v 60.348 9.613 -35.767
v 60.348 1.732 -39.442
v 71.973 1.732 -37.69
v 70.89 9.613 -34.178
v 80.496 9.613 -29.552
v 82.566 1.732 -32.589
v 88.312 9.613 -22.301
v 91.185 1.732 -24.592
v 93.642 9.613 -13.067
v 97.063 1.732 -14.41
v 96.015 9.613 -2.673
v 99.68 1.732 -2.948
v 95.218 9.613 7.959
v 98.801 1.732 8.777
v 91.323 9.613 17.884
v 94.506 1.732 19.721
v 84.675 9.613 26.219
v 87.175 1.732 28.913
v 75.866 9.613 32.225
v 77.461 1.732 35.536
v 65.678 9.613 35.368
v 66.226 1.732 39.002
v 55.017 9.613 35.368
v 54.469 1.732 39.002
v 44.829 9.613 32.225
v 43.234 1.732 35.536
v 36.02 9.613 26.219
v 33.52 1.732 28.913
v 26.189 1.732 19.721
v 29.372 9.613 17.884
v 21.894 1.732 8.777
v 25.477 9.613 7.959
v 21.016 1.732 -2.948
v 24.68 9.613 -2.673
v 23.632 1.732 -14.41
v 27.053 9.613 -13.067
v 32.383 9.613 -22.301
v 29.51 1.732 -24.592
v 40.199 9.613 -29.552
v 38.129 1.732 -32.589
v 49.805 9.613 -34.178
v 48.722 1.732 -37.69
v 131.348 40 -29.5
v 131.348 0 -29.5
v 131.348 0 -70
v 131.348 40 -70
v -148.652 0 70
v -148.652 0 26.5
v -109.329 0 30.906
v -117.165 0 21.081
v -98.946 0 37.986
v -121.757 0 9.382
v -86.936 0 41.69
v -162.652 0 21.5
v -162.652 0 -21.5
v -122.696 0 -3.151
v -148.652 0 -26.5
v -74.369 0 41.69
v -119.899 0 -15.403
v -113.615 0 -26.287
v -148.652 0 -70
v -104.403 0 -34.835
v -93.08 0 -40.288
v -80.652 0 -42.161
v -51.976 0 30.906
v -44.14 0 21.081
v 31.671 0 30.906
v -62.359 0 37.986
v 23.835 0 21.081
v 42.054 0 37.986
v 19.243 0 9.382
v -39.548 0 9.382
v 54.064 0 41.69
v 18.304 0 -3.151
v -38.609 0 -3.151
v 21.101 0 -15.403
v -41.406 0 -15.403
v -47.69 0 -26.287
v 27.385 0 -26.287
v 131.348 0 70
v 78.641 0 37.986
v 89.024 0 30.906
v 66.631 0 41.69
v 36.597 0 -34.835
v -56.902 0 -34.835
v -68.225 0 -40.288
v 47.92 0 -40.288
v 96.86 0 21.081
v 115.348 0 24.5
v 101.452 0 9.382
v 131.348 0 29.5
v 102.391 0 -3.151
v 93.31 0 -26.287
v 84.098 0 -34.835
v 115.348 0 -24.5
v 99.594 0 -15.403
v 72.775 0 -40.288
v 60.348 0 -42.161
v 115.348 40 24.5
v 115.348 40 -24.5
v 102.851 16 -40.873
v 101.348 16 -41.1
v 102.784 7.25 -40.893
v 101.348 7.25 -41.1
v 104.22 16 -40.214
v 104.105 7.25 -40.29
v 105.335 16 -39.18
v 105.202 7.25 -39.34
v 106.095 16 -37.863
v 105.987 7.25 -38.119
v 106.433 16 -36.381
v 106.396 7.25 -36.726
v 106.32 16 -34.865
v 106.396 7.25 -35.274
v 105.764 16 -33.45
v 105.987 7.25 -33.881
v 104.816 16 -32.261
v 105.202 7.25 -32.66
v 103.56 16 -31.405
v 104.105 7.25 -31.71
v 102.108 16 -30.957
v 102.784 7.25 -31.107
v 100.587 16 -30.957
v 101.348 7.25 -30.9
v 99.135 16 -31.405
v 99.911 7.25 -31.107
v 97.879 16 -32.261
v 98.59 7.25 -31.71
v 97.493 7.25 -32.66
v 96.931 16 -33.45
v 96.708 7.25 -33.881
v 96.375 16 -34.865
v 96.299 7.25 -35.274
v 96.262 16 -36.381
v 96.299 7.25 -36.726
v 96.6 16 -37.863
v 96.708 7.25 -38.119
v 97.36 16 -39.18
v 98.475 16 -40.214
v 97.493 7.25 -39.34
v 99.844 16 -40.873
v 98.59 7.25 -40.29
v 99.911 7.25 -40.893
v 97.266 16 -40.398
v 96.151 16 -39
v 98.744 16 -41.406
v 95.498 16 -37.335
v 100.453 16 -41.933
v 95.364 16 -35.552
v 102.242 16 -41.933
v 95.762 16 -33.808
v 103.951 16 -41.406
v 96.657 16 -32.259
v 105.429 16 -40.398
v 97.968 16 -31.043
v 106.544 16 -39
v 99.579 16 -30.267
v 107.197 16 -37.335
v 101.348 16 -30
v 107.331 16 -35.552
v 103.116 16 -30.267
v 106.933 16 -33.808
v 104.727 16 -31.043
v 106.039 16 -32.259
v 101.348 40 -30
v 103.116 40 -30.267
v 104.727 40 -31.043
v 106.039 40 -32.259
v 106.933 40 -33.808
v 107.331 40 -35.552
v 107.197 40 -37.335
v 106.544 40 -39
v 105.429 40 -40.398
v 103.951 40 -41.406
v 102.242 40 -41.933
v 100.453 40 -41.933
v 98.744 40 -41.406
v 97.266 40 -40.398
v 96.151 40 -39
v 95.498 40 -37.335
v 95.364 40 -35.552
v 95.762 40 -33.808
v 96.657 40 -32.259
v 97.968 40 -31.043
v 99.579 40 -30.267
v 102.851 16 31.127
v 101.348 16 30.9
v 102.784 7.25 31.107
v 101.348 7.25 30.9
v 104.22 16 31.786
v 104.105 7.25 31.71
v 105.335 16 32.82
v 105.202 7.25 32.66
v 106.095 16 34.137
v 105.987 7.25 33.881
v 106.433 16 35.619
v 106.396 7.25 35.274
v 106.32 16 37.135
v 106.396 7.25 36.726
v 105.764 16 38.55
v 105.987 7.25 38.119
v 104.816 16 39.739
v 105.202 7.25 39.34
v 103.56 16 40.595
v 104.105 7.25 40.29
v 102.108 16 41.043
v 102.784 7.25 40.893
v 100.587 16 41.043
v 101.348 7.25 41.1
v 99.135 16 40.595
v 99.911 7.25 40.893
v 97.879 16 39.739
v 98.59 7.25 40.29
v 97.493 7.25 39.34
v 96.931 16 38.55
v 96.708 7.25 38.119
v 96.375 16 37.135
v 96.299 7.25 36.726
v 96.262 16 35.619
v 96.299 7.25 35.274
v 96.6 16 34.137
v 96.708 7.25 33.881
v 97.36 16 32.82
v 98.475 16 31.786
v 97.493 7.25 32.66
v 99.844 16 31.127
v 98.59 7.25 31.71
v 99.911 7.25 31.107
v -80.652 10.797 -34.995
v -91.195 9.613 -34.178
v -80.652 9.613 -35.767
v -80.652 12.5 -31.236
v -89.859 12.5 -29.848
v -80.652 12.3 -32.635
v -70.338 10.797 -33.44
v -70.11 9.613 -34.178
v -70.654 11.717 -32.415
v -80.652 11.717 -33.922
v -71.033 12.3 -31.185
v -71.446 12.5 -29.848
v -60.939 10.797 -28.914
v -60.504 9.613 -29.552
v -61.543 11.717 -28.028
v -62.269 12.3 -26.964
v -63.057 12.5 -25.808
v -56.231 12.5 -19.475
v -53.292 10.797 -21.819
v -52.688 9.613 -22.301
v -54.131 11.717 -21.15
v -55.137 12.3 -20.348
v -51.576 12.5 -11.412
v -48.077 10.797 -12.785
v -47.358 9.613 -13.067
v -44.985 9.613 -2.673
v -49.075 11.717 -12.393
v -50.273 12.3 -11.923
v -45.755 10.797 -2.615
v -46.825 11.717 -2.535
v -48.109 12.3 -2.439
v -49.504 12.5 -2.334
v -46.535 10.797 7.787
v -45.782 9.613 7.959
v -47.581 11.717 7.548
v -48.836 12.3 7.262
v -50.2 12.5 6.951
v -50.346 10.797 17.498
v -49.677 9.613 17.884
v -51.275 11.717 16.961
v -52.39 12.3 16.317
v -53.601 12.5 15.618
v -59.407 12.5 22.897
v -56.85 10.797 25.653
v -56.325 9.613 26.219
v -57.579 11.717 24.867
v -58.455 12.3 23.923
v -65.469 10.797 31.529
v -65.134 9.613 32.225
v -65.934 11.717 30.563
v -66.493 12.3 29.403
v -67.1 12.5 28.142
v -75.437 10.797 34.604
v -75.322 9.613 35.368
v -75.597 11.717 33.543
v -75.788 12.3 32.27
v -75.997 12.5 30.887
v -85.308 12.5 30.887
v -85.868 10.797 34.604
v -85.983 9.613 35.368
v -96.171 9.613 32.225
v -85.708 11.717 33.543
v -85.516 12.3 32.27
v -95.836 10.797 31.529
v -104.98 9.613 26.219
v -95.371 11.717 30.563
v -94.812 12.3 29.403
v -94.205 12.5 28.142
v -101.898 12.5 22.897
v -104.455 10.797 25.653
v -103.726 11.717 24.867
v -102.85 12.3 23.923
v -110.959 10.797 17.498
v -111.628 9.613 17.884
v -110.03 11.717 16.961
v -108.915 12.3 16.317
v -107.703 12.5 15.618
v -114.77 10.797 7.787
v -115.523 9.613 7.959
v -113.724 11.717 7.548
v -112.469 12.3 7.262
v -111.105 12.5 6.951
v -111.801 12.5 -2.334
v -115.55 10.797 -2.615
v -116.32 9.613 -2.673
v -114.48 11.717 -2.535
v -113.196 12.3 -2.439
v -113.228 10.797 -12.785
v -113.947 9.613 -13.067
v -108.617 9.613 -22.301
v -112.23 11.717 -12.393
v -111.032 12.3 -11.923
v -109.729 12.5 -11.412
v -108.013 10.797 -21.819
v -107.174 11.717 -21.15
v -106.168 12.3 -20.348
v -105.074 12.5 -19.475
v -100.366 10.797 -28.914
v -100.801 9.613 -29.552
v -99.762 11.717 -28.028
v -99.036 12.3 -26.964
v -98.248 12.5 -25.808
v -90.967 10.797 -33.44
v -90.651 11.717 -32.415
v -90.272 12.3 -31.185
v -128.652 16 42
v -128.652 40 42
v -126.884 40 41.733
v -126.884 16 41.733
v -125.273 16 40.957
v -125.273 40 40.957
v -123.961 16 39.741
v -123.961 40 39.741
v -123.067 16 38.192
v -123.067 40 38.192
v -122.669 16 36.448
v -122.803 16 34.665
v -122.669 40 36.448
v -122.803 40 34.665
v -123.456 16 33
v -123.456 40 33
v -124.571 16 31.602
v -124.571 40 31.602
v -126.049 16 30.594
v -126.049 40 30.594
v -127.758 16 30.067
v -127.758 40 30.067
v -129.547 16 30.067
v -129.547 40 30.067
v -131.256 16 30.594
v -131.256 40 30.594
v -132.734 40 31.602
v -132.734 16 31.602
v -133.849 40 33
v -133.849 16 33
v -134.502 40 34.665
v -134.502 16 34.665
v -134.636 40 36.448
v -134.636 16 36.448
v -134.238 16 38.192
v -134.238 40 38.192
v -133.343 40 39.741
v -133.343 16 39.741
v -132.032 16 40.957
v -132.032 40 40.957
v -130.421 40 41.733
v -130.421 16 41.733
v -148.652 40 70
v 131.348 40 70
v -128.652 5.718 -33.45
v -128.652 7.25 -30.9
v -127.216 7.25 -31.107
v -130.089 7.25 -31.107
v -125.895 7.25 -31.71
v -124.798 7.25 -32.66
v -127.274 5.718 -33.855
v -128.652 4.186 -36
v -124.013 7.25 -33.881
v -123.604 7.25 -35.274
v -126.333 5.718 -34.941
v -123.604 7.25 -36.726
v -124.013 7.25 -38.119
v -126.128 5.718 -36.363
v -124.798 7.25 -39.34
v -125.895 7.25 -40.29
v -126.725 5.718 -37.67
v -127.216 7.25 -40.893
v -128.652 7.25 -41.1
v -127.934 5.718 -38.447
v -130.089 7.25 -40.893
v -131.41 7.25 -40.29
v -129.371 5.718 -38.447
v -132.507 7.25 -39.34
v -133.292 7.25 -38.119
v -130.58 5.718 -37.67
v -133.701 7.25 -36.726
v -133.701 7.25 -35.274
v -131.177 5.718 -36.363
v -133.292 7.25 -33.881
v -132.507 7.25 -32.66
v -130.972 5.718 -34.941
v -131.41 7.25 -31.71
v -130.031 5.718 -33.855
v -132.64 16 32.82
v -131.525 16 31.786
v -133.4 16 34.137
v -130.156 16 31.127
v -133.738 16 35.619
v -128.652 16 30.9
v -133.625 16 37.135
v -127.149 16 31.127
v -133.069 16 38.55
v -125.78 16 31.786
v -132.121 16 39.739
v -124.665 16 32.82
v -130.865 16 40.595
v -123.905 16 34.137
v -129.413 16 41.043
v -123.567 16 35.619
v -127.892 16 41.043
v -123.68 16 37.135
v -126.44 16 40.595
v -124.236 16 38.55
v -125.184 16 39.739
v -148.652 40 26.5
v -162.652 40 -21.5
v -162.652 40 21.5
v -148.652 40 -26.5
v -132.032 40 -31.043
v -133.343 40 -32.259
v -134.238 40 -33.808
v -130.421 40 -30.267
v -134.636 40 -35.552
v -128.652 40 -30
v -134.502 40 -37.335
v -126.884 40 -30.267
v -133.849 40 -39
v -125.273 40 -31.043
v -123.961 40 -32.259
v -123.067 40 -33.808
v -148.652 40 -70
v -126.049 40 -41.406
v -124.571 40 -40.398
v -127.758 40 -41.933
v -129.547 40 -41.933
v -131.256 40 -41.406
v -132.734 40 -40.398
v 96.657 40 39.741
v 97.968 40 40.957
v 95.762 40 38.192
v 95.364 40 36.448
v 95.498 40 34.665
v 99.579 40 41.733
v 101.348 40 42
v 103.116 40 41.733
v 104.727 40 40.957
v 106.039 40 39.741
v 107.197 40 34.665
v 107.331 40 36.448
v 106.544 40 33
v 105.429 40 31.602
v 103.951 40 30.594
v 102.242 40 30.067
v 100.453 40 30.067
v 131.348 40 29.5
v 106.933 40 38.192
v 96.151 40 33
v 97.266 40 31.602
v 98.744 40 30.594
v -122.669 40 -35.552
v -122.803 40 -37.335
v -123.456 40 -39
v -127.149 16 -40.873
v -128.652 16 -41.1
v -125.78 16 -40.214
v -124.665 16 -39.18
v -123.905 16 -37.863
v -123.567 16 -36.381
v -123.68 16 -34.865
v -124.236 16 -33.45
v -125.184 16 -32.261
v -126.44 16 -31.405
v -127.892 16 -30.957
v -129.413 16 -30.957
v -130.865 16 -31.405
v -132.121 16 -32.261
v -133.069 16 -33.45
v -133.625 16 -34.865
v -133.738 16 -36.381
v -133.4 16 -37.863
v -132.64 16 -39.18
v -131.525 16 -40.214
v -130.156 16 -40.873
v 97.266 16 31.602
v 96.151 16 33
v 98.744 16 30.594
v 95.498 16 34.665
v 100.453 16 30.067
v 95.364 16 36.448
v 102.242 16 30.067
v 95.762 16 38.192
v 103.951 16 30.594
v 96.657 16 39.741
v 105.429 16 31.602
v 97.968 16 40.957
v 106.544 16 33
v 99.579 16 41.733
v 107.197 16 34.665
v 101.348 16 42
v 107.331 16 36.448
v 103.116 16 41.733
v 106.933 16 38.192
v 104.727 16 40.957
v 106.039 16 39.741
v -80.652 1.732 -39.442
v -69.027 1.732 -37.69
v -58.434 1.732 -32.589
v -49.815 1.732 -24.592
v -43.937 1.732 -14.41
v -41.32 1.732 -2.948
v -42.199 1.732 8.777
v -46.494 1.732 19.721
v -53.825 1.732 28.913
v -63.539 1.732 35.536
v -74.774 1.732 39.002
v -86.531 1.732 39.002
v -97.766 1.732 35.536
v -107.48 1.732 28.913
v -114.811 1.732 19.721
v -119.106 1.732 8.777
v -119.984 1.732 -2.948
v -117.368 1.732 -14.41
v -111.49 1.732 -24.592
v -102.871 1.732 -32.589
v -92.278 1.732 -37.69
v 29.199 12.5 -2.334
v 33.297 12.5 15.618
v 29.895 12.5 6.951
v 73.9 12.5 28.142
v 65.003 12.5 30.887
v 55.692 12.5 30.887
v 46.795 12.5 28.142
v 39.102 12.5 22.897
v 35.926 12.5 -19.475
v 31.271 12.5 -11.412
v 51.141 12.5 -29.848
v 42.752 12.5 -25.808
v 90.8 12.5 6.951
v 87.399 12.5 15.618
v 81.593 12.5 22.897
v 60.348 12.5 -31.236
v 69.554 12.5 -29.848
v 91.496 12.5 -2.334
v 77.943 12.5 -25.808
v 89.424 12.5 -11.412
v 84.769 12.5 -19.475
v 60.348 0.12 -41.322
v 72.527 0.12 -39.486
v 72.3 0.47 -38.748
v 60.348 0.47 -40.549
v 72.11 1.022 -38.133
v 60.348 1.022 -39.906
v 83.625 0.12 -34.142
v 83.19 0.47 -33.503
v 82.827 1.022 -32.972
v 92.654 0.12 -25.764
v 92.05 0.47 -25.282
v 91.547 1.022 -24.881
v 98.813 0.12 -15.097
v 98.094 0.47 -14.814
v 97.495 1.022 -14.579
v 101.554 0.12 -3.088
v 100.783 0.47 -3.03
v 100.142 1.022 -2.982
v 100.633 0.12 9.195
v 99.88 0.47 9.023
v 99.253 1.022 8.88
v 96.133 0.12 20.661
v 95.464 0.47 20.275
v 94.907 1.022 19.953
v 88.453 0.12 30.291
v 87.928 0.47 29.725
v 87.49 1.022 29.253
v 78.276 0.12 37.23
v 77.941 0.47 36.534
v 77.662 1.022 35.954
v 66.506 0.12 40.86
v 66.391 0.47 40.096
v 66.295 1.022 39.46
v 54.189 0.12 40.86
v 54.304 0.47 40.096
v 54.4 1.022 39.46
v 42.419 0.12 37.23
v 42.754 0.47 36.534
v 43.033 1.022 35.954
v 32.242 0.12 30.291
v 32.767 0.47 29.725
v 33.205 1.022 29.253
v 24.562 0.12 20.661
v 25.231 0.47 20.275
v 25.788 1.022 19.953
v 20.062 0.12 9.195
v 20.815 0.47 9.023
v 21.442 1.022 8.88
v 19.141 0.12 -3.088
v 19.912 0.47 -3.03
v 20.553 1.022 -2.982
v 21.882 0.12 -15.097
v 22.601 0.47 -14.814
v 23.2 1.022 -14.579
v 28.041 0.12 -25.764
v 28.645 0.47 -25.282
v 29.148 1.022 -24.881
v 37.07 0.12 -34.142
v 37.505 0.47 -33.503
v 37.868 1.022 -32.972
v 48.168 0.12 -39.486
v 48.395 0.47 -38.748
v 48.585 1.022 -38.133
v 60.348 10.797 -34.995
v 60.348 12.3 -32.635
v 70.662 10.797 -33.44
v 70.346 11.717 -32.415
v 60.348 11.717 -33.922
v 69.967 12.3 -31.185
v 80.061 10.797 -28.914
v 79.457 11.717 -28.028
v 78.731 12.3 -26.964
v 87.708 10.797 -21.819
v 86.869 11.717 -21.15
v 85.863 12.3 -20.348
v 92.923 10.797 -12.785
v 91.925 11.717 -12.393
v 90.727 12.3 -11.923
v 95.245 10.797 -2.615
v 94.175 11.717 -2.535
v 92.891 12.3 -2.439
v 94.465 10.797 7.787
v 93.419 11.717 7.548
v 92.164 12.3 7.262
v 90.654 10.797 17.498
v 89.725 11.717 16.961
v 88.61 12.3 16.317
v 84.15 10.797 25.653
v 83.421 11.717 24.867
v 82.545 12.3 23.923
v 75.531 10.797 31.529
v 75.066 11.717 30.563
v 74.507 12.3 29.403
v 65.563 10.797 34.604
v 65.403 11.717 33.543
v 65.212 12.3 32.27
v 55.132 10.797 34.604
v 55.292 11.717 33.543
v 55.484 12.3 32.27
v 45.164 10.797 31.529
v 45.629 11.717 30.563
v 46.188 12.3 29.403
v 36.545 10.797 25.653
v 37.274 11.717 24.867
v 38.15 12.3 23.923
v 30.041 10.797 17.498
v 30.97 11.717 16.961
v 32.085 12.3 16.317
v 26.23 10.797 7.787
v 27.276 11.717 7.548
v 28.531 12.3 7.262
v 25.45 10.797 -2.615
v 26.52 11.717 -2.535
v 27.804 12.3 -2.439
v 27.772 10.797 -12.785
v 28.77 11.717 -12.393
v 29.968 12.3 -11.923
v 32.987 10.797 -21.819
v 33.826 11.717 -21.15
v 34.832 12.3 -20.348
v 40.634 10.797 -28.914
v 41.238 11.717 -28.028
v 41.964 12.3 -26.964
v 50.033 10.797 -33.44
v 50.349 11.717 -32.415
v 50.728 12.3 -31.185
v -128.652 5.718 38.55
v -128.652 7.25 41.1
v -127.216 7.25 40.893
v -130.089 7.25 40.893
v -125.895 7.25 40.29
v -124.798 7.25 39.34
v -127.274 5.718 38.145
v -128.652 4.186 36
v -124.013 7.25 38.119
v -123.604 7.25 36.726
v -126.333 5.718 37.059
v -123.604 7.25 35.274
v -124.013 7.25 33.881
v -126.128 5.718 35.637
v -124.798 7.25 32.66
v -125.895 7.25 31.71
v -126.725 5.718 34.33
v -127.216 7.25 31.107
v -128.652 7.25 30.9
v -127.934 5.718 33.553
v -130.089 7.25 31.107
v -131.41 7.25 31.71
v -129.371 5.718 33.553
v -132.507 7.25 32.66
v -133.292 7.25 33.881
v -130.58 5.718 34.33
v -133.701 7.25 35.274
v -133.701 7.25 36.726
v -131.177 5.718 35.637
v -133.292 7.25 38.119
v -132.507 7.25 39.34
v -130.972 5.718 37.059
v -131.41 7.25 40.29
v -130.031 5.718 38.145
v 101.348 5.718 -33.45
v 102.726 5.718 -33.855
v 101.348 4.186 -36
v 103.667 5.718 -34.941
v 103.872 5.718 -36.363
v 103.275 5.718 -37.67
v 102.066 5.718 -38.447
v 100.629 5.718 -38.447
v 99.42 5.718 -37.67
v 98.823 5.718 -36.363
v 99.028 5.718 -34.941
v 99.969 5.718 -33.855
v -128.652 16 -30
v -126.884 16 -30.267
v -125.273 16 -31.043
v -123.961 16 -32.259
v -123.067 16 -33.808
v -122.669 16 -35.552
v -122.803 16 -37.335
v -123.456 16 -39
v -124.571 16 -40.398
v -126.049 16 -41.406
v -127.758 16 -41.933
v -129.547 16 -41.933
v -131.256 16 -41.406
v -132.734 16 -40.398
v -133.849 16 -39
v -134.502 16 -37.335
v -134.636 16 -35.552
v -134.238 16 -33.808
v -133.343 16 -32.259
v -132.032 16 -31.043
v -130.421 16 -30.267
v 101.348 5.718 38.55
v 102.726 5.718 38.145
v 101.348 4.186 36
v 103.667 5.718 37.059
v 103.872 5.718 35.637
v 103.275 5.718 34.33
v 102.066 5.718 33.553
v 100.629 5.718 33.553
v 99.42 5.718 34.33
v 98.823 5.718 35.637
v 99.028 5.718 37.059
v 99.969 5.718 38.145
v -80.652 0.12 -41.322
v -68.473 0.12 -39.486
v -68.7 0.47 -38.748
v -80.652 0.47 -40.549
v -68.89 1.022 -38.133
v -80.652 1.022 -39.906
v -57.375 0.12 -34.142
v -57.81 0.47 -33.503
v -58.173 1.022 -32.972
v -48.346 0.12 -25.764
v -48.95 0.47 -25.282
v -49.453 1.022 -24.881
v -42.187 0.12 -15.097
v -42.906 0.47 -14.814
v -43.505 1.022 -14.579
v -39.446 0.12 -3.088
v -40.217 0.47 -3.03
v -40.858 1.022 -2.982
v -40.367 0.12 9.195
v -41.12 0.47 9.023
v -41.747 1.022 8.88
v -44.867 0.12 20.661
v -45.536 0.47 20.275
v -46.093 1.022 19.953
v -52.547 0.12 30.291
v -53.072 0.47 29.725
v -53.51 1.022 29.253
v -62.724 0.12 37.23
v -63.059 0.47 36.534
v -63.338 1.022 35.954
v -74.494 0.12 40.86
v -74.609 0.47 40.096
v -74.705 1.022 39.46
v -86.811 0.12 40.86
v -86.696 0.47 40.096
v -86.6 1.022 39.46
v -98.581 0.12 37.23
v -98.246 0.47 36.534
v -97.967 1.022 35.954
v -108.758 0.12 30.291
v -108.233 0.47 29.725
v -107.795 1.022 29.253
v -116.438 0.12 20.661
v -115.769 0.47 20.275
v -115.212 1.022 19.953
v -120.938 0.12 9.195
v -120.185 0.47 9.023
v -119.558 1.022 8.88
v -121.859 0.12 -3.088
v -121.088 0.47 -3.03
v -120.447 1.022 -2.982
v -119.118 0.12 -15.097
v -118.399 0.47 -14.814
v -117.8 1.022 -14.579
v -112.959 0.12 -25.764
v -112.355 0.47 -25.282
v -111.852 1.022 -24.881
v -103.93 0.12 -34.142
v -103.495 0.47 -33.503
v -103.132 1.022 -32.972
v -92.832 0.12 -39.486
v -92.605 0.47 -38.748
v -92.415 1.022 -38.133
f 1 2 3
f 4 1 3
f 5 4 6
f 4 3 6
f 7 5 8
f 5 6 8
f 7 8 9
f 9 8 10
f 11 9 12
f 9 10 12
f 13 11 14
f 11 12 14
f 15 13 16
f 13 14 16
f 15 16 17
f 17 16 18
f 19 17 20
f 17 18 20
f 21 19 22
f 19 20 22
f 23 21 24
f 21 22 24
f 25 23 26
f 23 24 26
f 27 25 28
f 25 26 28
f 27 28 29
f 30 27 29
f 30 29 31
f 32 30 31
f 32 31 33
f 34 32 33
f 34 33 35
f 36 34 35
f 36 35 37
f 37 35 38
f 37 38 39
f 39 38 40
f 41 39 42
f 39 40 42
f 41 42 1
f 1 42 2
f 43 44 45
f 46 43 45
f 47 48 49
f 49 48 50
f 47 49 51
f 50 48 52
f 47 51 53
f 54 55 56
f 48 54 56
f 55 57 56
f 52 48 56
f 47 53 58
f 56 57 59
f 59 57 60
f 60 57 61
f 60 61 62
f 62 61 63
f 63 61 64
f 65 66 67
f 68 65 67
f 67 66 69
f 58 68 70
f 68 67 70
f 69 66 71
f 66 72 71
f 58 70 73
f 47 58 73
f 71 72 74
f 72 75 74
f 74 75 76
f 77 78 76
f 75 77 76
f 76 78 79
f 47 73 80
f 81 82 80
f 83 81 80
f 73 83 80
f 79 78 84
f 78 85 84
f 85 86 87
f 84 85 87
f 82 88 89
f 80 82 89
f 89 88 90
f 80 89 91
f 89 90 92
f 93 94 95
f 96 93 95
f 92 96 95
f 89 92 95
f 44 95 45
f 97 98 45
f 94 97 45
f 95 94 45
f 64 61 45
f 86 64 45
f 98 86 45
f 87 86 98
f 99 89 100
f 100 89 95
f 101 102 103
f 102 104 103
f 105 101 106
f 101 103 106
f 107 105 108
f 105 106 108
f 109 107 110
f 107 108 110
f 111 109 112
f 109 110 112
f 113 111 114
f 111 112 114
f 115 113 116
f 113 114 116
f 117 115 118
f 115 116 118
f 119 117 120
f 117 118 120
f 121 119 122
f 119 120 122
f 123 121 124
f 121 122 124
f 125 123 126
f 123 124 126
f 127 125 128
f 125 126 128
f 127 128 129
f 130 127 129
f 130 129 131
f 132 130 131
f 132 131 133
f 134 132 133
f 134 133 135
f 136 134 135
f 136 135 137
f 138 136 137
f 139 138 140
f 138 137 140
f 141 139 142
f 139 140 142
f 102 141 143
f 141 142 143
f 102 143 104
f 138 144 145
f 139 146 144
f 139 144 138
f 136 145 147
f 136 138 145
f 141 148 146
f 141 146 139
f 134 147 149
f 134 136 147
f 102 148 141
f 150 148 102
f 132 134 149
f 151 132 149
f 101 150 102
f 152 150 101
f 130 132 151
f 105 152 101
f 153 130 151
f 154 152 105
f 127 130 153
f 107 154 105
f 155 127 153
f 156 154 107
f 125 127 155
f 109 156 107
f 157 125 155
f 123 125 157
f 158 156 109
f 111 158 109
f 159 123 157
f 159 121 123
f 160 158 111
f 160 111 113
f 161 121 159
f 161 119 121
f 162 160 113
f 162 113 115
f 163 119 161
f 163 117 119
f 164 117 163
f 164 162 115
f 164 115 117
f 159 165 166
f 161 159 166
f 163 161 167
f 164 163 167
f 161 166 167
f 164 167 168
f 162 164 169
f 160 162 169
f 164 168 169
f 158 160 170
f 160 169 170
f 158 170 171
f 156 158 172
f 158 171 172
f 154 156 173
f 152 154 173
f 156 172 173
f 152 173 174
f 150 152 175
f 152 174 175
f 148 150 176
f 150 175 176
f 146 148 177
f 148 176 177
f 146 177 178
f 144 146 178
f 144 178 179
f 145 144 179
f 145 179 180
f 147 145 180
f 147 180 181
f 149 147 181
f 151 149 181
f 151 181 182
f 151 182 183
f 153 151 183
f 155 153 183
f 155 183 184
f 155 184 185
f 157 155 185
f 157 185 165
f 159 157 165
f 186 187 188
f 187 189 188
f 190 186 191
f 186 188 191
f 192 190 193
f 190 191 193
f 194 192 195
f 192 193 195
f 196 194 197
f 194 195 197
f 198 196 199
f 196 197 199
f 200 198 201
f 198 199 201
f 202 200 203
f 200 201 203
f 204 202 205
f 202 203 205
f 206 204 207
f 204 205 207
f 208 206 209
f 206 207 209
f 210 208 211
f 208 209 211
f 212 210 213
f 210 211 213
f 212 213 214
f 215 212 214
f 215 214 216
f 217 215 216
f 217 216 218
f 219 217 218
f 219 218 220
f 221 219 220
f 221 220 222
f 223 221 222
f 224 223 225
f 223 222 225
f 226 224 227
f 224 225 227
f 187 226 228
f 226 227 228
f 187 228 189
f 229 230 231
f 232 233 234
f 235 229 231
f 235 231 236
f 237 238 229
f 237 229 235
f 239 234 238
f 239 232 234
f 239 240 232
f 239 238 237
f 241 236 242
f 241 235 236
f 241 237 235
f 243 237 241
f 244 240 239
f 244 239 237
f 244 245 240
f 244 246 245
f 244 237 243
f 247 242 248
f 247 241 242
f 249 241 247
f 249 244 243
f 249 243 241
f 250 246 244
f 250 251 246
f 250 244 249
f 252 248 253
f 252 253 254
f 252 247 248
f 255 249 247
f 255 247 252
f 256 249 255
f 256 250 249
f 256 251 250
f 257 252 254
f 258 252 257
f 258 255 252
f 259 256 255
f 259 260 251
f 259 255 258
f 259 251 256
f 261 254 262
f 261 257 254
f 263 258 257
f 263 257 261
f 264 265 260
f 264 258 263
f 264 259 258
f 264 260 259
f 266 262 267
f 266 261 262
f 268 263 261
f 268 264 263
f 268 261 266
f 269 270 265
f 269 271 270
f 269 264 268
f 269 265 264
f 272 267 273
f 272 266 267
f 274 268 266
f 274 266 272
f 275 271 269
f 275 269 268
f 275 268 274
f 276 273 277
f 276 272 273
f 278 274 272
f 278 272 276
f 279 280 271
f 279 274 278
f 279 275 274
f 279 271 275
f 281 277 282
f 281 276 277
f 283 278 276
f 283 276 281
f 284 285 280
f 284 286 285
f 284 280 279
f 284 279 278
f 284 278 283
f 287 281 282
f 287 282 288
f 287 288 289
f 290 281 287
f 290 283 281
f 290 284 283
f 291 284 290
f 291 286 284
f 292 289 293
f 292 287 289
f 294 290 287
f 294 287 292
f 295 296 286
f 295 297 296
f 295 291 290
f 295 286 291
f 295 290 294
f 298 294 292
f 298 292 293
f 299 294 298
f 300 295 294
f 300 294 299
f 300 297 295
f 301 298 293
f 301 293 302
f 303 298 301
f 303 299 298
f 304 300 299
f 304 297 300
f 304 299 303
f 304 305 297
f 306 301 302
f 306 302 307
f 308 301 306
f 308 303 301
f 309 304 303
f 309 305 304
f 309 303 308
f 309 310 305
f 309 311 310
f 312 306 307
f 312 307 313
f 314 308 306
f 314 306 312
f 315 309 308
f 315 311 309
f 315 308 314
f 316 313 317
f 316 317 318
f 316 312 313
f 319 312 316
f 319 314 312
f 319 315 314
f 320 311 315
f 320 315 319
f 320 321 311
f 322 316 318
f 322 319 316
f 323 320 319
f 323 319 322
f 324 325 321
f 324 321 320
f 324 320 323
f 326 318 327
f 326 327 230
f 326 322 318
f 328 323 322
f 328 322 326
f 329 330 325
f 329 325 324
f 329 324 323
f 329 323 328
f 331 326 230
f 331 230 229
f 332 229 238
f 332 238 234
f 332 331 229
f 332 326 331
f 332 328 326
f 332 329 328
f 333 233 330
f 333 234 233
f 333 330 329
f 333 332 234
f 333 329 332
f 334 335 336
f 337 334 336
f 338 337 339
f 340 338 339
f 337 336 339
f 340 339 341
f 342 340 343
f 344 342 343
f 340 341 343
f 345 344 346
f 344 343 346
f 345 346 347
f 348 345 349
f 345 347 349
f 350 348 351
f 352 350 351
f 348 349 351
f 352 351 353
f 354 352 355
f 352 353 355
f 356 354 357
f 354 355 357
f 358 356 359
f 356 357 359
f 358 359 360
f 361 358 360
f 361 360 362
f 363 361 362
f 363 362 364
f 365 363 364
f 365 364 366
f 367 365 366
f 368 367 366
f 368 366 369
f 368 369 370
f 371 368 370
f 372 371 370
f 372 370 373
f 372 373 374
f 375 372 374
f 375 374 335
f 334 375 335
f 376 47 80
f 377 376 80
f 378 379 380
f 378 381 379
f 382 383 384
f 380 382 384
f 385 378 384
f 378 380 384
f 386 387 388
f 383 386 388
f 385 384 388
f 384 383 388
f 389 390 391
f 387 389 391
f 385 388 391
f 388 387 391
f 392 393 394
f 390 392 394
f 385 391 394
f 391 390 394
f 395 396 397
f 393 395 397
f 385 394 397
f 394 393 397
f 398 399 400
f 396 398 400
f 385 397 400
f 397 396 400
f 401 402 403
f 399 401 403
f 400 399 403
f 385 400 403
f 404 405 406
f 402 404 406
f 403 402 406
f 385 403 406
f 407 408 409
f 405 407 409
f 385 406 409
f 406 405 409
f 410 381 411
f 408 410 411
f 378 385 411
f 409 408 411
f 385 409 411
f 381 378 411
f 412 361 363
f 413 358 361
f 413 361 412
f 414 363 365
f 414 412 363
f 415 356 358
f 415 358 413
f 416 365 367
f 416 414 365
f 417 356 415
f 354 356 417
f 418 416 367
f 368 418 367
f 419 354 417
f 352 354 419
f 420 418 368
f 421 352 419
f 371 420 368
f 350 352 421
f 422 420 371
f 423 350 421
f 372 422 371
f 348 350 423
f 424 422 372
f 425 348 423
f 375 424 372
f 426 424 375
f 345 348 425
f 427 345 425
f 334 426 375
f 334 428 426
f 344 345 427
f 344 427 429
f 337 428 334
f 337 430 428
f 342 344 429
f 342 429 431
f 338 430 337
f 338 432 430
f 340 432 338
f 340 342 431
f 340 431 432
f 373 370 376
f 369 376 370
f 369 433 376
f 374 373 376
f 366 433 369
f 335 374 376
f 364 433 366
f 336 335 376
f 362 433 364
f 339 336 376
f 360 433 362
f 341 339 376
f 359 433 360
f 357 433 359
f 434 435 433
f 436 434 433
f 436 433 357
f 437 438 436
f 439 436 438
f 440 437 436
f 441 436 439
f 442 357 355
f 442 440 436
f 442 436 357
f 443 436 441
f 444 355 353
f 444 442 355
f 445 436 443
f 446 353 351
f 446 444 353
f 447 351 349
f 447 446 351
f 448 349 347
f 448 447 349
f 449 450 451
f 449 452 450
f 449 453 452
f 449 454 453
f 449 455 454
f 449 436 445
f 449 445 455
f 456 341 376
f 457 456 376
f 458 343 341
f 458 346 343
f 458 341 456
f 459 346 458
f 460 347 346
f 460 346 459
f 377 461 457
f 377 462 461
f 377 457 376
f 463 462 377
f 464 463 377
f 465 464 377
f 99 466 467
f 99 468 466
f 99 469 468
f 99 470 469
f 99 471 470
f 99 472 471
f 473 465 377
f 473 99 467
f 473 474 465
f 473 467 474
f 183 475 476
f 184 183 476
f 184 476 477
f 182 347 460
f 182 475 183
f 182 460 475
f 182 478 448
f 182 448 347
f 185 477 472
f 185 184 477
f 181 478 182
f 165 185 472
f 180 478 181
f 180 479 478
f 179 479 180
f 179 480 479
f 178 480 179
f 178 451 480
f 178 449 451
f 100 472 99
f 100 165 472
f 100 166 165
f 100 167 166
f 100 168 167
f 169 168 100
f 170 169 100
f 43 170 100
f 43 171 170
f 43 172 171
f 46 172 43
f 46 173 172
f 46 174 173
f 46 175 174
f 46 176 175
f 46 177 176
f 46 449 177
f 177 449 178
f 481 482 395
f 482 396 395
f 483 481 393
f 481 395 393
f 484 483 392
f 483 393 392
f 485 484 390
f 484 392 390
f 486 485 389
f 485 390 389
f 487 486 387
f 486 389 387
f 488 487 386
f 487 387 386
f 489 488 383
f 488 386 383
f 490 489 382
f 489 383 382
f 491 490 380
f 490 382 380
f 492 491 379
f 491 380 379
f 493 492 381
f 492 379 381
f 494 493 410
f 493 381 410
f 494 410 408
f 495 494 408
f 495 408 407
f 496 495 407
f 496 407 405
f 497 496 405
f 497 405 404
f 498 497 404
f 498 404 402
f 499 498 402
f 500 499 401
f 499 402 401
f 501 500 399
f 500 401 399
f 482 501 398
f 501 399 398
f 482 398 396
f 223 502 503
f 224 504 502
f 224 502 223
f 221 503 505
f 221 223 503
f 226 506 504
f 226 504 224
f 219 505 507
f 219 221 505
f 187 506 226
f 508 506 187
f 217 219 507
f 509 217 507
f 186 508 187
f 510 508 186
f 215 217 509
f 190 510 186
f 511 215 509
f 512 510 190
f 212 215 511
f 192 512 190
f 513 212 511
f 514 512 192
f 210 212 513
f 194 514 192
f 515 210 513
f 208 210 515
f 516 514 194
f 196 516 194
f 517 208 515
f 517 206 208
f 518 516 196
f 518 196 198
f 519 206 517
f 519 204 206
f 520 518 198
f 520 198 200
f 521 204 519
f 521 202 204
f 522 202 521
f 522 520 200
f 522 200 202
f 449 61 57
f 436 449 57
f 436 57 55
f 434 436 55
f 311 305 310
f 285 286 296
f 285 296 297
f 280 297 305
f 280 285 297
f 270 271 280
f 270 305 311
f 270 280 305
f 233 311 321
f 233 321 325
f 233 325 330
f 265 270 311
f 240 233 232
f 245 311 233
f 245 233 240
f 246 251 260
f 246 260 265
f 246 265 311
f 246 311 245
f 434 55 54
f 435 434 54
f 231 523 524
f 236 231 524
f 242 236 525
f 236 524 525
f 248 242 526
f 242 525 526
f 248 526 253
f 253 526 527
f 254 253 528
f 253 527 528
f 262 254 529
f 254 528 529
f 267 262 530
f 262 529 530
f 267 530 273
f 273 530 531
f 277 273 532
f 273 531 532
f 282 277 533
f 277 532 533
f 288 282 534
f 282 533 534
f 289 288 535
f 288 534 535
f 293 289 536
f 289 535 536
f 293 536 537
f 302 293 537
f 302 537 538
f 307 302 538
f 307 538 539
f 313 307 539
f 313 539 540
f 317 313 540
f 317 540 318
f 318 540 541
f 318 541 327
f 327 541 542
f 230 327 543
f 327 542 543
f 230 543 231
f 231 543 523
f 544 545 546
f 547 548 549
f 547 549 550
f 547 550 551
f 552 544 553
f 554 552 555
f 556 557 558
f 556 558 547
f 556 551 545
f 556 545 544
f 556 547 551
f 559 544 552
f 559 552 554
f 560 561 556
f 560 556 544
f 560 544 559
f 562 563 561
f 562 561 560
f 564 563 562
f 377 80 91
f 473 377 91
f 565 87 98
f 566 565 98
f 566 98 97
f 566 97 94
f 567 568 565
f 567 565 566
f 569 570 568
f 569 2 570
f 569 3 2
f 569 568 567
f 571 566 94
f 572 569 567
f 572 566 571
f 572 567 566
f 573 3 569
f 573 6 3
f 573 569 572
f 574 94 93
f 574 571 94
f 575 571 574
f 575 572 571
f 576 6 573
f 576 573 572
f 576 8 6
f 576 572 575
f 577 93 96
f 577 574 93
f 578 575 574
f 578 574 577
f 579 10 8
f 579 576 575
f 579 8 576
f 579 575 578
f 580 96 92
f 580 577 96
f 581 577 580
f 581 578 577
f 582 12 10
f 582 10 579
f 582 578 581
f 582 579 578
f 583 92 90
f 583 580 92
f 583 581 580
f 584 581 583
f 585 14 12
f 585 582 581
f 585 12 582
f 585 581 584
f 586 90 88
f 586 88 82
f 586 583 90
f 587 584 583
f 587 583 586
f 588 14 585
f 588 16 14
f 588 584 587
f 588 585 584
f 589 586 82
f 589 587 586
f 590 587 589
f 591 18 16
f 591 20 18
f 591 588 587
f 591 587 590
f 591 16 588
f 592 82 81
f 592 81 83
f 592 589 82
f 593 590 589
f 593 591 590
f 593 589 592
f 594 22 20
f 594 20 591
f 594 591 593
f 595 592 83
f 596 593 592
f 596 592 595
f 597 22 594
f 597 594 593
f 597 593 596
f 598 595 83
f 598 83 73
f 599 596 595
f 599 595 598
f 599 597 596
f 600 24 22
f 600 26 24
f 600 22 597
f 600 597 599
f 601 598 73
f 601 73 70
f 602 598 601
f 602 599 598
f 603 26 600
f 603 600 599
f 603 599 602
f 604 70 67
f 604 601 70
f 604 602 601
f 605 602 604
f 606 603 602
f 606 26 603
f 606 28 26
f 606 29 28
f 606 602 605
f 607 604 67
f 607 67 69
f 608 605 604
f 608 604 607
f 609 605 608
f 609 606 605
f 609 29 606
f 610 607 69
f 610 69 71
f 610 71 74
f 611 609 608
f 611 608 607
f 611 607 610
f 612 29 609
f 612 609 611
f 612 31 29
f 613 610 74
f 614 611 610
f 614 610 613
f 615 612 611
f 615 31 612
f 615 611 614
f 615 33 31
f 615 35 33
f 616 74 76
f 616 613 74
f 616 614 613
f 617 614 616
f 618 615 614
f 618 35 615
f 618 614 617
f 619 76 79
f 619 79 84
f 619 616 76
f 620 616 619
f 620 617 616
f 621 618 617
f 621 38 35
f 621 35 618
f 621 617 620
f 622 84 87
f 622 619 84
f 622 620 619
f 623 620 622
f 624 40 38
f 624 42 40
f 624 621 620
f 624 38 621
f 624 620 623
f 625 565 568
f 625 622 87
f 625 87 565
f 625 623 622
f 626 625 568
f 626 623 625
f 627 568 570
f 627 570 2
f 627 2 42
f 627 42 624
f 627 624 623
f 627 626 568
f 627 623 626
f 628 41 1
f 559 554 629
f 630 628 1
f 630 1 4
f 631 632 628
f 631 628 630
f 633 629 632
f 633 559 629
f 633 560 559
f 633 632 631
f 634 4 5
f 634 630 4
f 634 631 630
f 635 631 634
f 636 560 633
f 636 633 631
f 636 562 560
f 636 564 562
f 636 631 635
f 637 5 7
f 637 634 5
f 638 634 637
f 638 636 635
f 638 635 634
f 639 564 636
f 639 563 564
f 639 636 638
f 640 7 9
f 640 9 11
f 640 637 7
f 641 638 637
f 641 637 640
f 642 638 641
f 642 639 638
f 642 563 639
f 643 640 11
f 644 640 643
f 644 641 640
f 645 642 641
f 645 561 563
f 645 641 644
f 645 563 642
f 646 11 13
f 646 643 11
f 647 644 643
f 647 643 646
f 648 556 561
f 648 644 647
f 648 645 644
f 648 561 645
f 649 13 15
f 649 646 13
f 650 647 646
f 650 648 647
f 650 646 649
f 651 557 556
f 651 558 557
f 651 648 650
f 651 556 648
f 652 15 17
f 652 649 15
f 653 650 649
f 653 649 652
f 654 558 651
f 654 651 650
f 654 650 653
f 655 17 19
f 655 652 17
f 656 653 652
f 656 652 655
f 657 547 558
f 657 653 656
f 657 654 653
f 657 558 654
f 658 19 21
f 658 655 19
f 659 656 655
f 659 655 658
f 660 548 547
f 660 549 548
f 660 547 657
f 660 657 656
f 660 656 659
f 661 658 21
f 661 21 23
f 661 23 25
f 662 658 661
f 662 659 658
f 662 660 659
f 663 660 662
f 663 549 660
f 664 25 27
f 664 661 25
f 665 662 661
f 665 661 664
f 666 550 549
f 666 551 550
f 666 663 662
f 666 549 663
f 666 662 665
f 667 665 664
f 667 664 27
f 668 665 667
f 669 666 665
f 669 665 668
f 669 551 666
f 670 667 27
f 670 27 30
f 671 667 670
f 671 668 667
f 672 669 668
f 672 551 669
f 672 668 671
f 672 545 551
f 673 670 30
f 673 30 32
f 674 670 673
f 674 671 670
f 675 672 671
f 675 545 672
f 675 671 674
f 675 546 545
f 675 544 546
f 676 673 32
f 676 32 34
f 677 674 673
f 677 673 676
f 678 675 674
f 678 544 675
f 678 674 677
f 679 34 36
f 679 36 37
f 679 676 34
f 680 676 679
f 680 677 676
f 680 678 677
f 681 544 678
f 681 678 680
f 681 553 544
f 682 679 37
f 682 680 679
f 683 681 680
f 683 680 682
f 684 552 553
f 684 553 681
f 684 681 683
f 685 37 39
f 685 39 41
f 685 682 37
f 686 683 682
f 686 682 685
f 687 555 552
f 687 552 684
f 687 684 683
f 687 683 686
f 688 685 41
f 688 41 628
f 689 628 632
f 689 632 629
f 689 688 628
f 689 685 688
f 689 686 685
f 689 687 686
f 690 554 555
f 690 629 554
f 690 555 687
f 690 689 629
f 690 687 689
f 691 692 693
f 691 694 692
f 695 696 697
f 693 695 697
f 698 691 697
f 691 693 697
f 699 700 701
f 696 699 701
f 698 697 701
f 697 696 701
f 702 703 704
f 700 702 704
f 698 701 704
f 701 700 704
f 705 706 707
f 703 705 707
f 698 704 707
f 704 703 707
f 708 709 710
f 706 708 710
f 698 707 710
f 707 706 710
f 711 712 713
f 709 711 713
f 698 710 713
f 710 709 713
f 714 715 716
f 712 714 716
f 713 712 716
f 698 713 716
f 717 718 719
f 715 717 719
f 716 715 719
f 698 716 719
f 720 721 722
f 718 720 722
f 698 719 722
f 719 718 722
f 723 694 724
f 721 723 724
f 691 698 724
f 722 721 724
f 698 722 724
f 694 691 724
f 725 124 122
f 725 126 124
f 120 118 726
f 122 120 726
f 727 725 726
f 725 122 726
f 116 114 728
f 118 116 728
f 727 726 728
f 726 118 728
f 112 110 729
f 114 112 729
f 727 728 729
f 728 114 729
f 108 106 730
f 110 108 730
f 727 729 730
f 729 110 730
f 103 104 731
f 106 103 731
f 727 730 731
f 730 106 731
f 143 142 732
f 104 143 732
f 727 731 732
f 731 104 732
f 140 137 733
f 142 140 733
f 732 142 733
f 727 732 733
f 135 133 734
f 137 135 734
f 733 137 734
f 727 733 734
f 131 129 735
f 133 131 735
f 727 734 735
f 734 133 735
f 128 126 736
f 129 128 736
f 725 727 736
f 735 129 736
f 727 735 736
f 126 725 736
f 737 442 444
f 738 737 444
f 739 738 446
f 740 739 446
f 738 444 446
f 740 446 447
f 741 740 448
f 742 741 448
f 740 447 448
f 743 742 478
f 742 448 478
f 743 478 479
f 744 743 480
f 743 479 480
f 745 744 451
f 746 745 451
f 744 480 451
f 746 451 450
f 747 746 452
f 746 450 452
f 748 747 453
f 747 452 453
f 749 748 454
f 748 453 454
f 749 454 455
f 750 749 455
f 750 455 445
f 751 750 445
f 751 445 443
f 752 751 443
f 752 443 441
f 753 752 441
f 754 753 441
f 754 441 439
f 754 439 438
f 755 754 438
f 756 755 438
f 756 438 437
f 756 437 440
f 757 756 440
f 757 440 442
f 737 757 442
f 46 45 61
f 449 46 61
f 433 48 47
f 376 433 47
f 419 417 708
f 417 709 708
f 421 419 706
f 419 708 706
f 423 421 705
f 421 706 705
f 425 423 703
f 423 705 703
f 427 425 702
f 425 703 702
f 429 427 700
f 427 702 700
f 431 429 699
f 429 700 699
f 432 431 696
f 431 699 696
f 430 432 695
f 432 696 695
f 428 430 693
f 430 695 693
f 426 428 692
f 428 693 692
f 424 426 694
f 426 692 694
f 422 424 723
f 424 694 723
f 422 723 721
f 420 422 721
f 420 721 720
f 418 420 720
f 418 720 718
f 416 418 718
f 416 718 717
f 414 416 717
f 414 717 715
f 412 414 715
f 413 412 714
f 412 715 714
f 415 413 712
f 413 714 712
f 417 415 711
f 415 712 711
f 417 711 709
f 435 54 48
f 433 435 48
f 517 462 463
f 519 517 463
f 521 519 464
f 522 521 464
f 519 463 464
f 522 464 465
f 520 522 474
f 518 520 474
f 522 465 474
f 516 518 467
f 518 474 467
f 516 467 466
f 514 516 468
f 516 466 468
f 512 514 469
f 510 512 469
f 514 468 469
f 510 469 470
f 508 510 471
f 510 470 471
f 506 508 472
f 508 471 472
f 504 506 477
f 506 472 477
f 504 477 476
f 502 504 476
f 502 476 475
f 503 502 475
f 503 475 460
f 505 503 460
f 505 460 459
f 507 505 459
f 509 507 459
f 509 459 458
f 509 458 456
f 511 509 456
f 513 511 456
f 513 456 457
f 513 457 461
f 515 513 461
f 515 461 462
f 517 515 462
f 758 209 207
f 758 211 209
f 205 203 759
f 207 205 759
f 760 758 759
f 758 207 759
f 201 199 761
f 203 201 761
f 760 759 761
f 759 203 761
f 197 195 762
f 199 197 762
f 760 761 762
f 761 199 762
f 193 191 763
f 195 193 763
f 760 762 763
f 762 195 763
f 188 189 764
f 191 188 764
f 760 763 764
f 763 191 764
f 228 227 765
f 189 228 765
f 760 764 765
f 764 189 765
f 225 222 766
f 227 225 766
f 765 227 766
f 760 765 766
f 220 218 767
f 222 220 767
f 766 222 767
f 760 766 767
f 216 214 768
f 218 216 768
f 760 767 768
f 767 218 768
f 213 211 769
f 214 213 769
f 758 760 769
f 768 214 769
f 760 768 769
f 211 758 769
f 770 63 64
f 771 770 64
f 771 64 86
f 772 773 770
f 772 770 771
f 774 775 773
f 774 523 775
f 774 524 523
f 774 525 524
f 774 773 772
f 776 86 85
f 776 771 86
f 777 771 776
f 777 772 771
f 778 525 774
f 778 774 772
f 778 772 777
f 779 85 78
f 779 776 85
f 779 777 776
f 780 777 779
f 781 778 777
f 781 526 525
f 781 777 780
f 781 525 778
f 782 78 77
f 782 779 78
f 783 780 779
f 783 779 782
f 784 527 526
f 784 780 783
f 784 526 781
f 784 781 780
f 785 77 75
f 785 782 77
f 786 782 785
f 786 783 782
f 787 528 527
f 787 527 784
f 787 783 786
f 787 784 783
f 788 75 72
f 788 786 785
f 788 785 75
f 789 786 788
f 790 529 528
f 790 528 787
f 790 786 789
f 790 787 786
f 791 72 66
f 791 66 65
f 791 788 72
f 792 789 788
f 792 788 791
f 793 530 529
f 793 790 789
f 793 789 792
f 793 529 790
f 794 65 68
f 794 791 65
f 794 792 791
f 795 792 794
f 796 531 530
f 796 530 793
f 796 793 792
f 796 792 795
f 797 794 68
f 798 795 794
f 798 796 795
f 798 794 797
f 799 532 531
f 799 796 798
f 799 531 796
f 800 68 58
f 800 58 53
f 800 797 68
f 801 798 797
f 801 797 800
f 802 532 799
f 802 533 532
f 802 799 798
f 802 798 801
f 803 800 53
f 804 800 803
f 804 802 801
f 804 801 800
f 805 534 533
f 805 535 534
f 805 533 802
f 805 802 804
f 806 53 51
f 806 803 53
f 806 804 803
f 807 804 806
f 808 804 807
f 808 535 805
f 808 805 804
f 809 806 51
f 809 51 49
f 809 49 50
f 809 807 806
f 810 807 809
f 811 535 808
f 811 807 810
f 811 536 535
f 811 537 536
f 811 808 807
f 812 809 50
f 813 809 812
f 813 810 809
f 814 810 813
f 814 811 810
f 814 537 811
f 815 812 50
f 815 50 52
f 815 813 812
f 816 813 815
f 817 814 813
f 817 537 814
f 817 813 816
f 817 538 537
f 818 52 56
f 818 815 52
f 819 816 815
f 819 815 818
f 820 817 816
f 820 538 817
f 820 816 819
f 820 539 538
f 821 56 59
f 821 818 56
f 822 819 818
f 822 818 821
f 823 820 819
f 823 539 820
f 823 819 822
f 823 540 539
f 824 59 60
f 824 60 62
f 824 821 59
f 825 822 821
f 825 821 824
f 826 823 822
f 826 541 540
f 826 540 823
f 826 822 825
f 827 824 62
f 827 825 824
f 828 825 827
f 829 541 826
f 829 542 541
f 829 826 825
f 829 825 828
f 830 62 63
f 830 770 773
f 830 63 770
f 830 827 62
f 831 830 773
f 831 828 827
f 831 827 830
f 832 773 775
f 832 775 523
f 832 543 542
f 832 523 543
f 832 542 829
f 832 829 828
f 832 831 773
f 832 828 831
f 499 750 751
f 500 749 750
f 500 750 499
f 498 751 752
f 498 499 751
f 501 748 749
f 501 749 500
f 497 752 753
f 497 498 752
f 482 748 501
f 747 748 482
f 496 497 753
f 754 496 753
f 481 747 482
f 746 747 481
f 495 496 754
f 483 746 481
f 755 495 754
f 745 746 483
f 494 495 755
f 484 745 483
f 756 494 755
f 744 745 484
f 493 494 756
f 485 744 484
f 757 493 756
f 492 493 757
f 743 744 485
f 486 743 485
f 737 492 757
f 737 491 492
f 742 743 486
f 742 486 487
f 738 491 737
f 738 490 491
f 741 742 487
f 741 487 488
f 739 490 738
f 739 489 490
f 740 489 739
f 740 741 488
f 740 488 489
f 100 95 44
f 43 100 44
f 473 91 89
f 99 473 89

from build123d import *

# Parameters (mm, degrees)
ESTRUSIONE1_DEPTH                   = 40
SCHIZZO5_R                          = 40.25
ESTRUSIONE4_DEPTH                   = 12.5
SFORMO2_ANGLE                       = 25
RACCORDO1_R                         = 3
RACCORDO2_R                         = 5
RIPETIZIONE_A_L1_COUNT              = 2
RIPETIZIONE_A_L1_PITCH              = 141
SFORMO2_OF_RIPETIZIONE_A_L1_2_ANGLE = 25
RACCORDO1_OF_RIPETIZIONE_A_L1_R     = 3
RACCORDO2_OF_RIPETIZIONE_A_L1_R     = 5
M12_TAPPED_HOLE1_D                  = 10.2
M12_TAPPED_HOLE1_DEPTH              = 32.75
M12_TAPPED_HOLE1_CBORE_D            = 12
M12_TAPPED_HOLE1_CBORE_DEPTH        = 24
M12_TAPPED_HOLE1_TIP                = 3.064389157


with BuildPart() as part:
    # Schizzo2 → Estrusione1 (new body)
    with BuildSketch(Plane(origin=(0, 0, 0), x_dir=(1, 0, 0), z_dir=(0, 1, 0))):
        Polygon((-162.652486086, 21.5), (-162.652486086, -21.5), (-148.652486086, -26.5), (-148.652486086, -66), (-148.652486086, -70), (-144.652486086, -70), (127.347513914, -70), (131.347513914, -70), (131.347513914, -66), (131.347513914, -29.5), (115.347513914, -24.5), (115.347513914, 24.5), (131.347513914, 29.5), (131.347513914, 66), (131.347513914, 70), (127.347513914, 70), (-144.652486086, 70), (-148.652486086, 70), (-148.652486086, 66), (-148.652486086, 26.5), align=None)
    extrude(amount=ESTRUSIONE1_DEPTH)

    # Schizzo5 → Estrusione4 (cut)
    with BuildSketch(Plane.XZ):
        with Locations(Location((-80.652486086, 0, 0), (0, 0, 270))):
            Circle(SCHIZZO5_R)
    estrusione4 = extrude(amount=-ESTRUSIONE4_DEPTH, mode=Mode.SUBTRACT)

    # Sformo2
    sformo2_faces = [part.faces().sort_by_distance(p)[0] for p in [
        (-80.652486086, 6.25, 40.25),
    ]]
    draft(sformo2_faces, Plane(origin=(131.347513914, 0, 29.5), x_dir=(0, 0, -1), z_dir=(0, -1, 0)), SFORMO2_ANGLE)

    # Raccordo1
    raccordo1_edges = [part.edges().sort_by_distance(p)[0] for p in [
        (-80.652486086, 0, 40.25),
    ]]
    fillet(raccordo1_edges, radius=RACCORDO1_R)

    # Raccordo2
    raccordo2_edges = [part.edges().sort_by_distance(p)[0] for p in [
        (-80.652486086, 12.5, 34.421154273),
    ]]
    fillet(raccordo2_edges, radius=RACCORDO2_R)

    # Ripetizione a L1: Estrusione4 ×2
    with Locations(*[(i * RIPETIZIONE_A_L1_PITCH, 0, 0) for i in range(1, RIPETIZIONE_A_L1_COUNT)]):
        add(estrusione4, mode=Mode.SUBTRACT)

    # Sformo2 of Ripetizione a L1 2
    sformo2_of_ripetizione_a_l1_2_faces = [part.faces().sort_by_distance(p)[0] for p in [
        (60.347513914, 6.25, 40.25),
    ]]
    draft(sformo2_of_ripetizione_a_l1_2_faces, Plane(origin=(272.347513914, 0, 29.5), x_dir=(0, 0, -1), z_dir=(0, -1, 0)), SFORMO2_OF_RIPETIZIONE_A_L1_2_ANGLE)

    # Raccordo1 of Ripetizione a L1
    raccordo1_of_ripetizione_a_l1_edges = [part.edges().sort_by_distance(p)[0] for p in [
        (60.347513914, 0, 40.25),
    ]]
    fillet(raccordo1_of_ripetizione_a_l1_edges, radius=RACCORDO1_OF_RIPETIZIONE_A_L1_R)

    # Raccordo2 of Ripetizione a L1
    raccordo2_of_ripetizione_a_l1_edges = [part.edges().sort_by_distance(p)[0] for p in [
        (60.347513914, 12.5, 34.421154273),
    ]]
    fillet(raccordo2_of_ripetizione_a_l1_edges, radius=RACCORDO2_OF_RIPETIZIONE_A_L1_R)

    # M12 Tapped Hole1
    with Locations(Plane(origin=(-128.652486086, 40, -36), x_dir=(0, 0, 1), z_dir=(0, 1, 0))):
        with Locations((0, 0), (0, 230), (72, 230), (72, 0)):
            CounterBoreHole(M12_TAPPED_HOLE1_D / 2, M12_TAPPED_HOLE1_CBORE_D / 2, M12_TAPPED_HOLE1_CBORE_DEPTH, depth=M12_TAPPED_HOLE1_DEPTH)
            with Locations((0, 0, -(M12_TAPPED_HOLE1_DEPTH + M12_TAPPED_HOLE1_TIP / 2))):  # 118° drill point
                Cone(0, M12_TAPPED_HOLE1_D / 2, M12_TAPPED_HOLE1_TIP, mode=Mode.SUBTRACT)


solid = part.part
